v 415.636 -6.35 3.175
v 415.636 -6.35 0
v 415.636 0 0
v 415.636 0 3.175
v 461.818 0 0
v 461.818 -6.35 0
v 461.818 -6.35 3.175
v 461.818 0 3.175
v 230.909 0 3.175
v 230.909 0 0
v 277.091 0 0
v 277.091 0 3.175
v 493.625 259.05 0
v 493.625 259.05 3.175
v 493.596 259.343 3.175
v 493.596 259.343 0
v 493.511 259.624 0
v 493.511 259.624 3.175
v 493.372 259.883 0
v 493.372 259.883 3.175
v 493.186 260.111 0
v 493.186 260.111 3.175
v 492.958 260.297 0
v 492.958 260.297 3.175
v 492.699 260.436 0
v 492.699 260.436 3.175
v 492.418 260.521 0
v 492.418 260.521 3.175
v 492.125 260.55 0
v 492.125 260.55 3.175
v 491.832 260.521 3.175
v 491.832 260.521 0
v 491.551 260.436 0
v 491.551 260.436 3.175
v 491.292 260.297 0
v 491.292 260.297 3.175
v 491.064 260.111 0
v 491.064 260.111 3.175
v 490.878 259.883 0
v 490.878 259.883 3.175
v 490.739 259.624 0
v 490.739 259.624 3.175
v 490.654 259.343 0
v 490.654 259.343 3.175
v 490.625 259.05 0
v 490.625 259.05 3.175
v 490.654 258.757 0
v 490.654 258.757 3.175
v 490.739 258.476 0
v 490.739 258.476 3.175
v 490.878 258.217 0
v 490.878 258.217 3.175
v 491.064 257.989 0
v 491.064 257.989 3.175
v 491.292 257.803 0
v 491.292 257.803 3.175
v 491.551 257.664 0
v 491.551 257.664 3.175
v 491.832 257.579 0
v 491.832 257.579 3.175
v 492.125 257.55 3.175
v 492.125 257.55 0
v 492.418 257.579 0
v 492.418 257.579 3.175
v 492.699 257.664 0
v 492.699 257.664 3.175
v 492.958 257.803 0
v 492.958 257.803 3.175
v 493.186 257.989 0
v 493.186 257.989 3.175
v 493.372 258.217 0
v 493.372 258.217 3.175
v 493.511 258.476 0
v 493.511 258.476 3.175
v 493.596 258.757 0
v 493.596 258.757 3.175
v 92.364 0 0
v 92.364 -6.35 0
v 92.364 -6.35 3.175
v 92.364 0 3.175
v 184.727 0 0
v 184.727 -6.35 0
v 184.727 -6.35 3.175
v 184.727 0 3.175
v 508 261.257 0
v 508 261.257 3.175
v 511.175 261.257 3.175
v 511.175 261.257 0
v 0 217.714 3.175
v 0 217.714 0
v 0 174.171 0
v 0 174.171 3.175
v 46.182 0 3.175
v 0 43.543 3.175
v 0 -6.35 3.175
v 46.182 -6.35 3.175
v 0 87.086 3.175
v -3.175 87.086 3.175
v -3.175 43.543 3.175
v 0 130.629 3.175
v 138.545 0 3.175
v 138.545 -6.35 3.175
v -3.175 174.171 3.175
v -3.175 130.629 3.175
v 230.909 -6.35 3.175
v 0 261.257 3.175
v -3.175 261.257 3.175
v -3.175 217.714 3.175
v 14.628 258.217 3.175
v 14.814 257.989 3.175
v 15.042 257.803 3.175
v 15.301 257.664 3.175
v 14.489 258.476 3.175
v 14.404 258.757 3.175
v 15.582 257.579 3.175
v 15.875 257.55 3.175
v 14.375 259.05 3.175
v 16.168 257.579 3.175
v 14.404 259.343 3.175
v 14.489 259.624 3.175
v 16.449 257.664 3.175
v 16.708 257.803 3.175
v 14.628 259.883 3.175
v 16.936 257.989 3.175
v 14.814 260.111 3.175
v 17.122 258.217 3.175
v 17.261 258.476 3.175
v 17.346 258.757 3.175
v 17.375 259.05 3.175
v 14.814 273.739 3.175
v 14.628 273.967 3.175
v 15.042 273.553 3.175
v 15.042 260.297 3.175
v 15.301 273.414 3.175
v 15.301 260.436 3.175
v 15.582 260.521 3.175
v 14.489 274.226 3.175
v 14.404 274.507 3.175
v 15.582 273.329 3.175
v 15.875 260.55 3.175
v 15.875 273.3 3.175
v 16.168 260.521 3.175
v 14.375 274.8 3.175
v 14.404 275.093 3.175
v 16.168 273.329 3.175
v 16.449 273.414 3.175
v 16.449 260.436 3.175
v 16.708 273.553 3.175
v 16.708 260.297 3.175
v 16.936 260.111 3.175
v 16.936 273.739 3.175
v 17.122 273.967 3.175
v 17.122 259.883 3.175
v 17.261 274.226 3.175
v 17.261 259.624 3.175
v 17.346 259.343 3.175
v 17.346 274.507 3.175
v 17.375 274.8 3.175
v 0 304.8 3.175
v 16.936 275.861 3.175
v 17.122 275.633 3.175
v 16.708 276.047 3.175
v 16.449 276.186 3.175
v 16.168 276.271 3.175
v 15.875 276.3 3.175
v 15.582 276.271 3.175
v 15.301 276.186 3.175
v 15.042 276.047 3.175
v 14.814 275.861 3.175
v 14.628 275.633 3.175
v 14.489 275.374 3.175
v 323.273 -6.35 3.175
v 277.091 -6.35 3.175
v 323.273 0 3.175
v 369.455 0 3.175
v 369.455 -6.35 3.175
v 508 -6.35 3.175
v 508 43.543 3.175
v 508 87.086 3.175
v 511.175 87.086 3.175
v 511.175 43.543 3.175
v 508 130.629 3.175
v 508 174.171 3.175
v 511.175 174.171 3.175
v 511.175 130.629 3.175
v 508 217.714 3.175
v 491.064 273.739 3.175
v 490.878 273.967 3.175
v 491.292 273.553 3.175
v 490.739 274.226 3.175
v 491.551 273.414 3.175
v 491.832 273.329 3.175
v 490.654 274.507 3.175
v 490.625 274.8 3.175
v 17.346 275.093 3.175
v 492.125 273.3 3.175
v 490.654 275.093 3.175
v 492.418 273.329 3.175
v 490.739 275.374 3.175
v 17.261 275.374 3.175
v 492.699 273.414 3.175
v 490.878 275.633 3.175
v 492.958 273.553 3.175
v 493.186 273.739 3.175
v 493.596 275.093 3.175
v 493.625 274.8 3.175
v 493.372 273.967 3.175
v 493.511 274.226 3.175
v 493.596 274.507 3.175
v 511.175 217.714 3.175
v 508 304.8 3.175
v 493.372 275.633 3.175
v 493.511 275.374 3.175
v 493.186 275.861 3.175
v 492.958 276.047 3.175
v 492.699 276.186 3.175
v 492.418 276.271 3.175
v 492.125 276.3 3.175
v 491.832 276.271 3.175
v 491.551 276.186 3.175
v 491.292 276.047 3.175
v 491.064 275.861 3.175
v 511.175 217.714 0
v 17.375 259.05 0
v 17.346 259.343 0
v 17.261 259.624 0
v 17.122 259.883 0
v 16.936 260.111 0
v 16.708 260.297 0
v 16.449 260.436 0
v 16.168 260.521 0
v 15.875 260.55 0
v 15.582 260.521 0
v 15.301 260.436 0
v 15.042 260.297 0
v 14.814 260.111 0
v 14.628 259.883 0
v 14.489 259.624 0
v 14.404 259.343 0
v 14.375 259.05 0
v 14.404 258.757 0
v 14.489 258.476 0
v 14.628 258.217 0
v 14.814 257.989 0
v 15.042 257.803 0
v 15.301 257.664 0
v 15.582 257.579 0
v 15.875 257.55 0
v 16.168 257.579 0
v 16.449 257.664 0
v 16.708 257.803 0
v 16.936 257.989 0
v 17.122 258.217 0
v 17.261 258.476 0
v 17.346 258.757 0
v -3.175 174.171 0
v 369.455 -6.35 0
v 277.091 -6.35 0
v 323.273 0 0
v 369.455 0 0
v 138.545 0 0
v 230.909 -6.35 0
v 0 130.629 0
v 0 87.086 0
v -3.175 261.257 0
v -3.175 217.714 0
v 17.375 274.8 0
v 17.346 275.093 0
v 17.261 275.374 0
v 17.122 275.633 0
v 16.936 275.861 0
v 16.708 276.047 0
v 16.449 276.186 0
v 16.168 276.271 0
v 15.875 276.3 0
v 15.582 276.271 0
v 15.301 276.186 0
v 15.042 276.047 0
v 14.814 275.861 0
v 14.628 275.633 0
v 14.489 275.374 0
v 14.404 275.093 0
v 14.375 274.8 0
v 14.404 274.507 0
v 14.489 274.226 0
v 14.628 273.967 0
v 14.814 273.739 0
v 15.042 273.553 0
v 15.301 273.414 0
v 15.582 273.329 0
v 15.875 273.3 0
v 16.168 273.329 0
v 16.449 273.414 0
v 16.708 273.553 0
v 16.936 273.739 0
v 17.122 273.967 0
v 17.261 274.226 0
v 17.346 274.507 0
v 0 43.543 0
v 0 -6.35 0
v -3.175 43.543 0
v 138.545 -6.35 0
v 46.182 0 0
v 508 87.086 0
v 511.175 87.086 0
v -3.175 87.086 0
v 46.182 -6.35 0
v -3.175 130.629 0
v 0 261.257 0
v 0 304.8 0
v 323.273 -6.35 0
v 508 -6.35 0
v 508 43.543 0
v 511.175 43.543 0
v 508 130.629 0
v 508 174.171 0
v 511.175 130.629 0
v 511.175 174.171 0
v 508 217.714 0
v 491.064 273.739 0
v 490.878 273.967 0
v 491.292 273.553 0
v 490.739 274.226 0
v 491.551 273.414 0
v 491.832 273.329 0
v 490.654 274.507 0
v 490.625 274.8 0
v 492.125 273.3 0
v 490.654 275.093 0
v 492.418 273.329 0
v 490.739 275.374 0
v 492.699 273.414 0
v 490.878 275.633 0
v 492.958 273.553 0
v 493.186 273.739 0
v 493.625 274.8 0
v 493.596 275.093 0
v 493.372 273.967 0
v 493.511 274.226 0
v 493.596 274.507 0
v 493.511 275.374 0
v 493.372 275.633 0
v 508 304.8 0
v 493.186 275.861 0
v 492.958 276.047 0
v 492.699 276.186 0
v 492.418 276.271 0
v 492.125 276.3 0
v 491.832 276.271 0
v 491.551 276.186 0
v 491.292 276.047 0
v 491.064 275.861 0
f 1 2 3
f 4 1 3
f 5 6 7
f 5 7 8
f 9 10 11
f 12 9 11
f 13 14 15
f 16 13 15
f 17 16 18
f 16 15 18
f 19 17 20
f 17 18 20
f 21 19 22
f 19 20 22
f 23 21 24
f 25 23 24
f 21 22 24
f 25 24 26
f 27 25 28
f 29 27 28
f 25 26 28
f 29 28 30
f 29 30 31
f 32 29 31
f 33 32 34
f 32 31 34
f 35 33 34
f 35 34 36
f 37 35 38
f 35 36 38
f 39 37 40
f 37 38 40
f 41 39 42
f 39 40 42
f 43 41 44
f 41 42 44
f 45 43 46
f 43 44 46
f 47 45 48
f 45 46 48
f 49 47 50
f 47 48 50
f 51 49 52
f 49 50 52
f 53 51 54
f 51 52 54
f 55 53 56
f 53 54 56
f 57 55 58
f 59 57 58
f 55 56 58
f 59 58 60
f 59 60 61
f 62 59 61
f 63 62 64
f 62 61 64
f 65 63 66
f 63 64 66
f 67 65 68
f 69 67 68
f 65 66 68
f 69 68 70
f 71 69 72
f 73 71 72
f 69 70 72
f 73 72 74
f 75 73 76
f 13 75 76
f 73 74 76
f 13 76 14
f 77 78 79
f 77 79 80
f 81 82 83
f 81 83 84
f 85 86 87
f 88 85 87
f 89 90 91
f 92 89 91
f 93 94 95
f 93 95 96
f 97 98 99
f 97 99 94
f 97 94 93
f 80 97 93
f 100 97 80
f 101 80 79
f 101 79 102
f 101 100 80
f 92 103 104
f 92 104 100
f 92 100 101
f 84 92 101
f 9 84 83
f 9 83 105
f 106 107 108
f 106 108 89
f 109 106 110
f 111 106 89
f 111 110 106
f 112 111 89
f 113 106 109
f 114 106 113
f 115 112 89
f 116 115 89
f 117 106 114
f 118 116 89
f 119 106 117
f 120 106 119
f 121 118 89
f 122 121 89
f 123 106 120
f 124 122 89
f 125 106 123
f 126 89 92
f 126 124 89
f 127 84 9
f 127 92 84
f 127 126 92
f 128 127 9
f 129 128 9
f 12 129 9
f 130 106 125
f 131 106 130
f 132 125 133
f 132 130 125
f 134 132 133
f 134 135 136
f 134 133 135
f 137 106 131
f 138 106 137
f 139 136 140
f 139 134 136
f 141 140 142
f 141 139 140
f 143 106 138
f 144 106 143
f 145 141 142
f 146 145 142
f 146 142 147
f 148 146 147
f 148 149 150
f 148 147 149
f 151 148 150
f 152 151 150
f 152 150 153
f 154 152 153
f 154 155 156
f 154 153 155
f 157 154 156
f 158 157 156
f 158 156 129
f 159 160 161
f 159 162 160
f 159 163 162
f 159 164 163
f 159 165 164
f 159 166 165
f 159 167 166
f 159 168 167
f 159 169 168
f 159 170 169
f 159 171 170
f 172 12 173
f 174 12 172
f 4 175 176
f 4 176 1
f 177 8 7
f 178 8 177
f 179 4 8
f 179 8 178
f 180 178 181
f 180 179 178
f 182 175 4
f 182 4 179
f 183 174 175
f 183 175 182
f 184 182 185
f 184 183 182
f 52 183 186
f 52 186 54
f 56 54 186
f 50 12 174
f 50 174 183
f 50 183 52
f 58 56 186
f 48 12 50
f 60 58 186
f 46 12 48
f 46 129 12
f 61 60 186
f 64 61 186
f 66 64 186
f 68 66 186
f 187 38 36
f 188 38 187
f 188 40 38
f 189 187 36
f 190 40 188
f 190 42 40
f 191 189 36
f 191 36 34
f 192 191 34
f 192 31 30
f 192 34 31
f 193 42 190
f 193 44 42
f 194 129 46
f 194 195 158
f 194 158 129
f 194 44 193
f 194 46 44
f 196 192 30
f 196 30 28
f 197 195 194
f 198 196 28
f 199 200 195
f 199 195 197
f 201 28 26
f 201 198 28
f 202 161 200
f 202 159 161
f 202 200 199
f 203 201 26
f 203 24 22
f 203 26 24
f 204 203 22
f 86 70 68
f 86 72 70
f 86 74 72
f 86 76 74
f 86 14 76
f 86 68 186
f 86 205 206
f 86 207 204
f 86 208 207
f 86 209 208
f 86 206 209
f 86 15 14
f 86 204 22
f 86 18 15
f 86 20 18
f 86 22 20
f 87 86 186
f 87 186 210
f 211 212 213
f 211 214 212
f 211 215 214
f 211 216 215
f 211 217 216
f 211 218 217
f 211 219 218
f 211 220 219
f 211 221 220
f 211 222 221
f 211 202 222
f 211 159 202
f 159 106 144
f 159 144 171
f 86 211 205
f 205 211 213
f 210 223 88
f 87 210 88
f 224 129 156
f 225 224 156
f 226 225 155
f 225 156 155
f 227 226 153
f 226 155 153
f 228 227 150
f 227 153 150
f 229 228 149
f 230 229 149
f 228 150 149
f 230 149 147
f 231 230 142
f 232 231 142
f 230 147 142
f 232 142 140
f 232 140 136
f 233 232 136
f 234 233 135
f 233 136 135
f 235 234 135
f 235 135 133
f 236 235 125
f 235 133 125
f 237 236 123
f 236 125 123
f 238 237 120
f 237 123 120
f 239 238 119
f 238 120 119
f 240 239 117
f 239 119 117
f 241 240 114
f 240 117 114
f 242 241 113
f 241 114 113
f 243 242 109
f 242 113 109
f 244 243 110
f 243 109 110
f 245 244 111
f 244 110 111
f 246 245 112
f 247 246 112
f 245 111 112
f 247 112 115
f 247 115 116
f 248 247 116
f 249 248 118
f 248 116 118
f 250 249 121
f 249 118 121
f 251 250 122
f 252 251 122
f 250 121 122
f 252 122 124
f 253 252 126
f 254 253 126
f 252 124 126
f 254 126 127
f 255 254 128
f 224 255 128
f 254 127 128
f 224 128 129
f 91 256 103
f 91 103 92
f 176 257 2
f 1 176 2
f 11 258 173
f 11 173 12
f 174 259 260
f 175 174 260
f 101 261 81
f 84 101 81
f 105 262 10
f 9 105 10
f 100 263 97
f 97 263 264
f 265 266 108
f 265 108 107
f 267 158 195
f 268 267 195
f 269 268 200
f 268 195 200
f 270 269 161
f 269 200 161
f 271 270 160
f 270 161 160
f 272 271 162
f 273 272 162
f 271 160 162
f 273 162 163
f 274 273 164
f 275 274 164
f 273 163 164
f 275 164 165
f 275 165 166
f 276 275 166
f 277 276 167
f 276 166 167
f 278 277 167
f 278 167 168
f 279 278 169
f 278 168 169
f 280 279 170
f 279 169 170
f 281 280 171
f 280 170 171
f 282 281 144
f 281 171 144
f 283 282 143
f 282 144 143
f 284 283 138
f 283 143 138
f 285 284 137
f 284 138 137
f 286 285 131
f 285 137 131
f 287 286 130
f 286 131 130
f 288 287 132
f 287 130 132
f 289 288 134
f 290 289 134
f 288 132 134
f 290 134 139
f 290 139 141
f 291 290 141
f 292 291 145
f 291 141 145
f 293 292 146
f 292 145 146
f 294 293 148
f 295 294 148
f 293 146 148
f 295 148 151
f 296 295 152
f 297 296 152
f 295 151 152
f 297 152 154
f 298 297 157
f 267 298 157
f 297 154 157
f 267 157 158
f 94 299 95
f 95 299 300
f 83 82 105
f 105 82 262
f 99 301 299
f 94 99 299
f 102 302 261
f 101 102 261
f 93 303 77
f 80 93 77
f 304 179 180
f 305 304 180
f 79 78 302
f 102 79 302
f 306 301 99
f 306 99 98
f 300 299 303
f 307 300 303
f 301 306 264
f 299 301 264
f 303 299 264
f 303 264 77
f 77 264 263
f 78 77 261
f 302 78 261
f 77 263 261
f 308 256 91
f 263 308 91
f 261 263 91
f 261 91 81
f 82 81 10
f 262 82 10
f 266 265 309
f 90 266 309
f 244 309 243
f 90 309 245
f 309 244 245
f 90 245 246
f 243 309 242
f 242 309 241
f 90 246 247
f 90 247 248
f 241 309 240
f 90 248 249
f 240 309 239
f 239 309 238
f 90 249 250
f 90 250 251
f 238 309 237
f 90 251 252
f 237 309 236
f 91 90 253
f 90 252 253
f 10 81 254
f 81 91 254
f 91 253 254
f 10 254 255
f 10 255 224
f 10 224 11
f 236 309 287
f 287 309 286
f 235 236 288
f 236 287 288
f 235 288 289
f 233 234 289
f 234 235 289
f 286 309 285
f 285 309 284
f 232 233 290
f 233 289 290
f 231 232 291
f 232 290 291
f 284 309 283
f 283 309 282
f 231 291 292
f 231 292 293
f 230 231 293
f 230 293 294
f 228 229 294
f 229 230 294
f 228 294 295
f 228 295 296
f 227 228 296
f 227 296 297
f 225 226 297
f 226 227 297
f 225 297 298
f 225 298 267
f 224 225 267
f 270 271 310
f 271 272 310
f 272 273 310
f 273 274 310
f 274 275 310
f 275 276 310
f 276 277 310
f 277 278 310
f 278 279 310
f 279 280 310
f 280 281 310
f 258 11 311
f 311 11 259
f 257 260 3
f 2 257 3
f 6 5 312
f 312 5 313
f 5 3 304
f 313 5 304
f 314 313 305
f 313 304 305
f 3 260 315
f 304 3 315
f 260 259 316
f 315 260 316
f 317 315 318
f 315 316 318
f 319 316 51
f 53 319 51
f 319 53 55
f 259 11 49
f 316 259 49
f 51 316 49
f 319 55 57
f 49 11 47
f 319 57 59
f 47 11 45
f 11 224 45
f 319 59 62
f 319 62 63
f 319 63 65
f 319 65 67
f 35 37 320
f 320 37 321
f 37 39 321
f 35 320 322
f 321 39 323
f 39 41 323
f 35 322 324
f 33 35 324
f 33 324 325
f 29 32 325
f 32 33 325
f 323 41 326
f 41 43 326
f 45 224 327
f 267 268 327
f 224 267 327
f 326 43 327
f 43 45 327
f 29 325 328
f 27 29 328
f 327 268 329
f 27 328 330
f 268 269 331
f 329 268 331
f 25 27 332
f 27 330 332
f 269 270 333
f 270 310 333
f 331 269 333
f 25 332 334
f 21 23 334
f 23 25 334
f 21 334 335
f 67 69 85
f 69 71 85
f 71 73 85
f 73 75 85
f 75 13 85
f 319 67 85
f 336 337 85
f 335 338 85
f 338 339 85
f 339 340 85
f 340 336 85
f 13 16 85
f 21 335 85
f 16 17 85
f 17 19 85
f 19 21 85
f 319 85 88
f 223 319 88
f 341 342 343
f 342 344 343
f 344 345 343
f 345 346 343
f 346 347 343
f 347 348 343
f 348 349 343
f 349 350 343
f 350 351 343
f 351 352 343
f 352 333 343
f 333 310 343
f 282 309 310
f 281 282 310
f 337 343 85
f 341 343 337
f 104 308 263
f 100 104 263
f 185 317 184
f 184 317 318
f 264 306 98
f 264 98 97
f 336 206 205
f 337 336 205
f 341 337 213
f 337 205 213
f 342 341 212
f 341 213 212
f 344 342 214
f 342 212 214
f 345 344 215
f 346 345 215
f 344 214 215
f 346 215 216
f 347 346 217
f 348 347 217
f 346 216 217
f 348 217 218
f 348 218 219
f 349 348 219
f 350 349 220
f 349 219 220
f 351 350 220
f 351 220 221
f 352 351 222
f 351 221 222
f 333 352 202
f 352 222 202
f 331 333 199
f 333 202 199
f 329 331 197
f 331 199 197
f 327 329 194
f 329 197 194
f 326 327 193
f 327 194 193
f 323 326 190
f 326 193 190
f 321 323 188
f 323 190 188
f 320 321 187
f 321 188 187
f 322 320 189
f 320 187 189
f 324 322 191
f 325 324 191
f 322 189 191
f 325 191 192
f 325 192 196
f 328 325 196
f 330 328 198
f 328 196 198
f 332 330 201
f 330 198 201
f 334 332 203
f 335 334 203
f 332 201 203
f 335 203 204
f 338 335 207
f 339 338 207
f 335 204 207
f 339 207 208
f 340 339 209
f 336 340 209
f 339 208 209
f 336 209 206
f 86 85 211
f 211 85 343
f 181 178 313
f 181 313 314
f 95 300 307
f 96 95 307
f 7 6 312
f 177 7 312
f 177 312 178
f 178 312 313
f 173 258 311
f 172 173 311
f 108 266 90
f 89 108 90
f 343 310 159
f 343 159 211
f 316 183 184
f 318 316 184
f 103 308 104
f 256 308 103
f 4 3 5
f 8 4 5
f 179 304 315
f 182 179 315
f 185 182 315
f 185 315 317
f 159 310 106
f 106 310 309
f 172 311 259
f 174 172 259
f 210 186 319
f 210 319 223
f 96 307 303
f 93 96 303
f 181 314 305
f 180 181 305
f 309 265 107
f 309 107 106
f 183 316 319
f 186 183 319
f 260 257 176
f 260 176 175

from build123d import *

# Parameters (mm, degrees)
SKETCH1_W           = 508
SKETCH1_H           = 304.8
SKETCH1_W_2         = 46.181818182
SKETCH1_H_2         = 6.35
SKETCH1_W_3         = 46.181818181
SKETCH1_W_4         = 3.175
SKETCH1_H_3         = 43.542857143
SKETCH1_H_4         = 43.542857142
BOSS_EXTRUDE1_DEPTH = 3.175
SKETCH2_R           = 1.5
CUT_EXTRUDE1_DEPTH  = 3.175


with BuildPart() as part:
    # Sketch1 → Boss-Extrude1 (new body)
    with BuildSketch(Plane.XY):
        with Locations((254, 152.4)):
            Rectangle(SKETCH1_W, SKETCH1_H)
        with Locations((23.090909091, -3.175)):
            Rectangle(SKETCH1_W_2, SKETCH1_H_2)
        with Locations((115.454545455, -3.175)):
            Rectangle(SKETCH1_W_3, SKETCH1_H_2)
        with Locations((207.818181818, -3.175)):
            Rectangle(SKETCH1_W_2, SKETCH1_H_2)
        with Locations((300.181818182, -3.175)):
            Rectangle(SKETCH1_W_2, SKETCH1_H_2)
        with Locations((392.545454545, -3.175)):
            Rectangle(SKETCH1_W_3, SKETCH1_H_2)
        with Locations((484.909090909, -3.175)):
            Rectangle(SKETCH1_W_2, SKETCH1_H_2)
        with Locations((509.5875, 65.314285715)):
            Rectangle(SKETCH1_W_4, SKETCH1_H_3)
        with Locations((509.5875, 152.4)):
            Rectangle(SKETCH1_W_4, SKETCH1_H_4)
        with Locations((509.5875, 239.485714286)):
            Rectangle(SKETCH1_W_4, SKETCH1_H_3)
        with Locations((-1.5875, 239.485714286)):
            Rectangle(SKETCH1_W_4, SKETCH1_H_3)
        with Locations((-1.5875, 152.4)):
            Rectangle(SKETCH1_W_4, SKETCH1_H_4)
        with Locations((-1.5875, 65.314285715)):
            Rectangle(SKETCH1_W_4, SKETCH1_H_3)
    extrude(amount=BOSS_EXTRUDE1_DEPTH)

    # Sketch2 → Cut-Extrude1 (cut)
    with BuildSketch(Plane.XY.offset(3.175)):
        with Locations((15.875, 274.8)):
            Circle(SKETCH2_R)
        with Locations((15.875, 259.05)):
            Circle(SKETCH2_R)
        with Locations((492.125, 259.05)):
            Circle(SKETCH2_R)
        with Locations((492.125, 274.8)):
            Circle(SKETCH2_R)
    extrude(amount=-CUT_EXTRUDE1_DEPTH, mode=Mode.SUBTRACT)


solid = part.part
